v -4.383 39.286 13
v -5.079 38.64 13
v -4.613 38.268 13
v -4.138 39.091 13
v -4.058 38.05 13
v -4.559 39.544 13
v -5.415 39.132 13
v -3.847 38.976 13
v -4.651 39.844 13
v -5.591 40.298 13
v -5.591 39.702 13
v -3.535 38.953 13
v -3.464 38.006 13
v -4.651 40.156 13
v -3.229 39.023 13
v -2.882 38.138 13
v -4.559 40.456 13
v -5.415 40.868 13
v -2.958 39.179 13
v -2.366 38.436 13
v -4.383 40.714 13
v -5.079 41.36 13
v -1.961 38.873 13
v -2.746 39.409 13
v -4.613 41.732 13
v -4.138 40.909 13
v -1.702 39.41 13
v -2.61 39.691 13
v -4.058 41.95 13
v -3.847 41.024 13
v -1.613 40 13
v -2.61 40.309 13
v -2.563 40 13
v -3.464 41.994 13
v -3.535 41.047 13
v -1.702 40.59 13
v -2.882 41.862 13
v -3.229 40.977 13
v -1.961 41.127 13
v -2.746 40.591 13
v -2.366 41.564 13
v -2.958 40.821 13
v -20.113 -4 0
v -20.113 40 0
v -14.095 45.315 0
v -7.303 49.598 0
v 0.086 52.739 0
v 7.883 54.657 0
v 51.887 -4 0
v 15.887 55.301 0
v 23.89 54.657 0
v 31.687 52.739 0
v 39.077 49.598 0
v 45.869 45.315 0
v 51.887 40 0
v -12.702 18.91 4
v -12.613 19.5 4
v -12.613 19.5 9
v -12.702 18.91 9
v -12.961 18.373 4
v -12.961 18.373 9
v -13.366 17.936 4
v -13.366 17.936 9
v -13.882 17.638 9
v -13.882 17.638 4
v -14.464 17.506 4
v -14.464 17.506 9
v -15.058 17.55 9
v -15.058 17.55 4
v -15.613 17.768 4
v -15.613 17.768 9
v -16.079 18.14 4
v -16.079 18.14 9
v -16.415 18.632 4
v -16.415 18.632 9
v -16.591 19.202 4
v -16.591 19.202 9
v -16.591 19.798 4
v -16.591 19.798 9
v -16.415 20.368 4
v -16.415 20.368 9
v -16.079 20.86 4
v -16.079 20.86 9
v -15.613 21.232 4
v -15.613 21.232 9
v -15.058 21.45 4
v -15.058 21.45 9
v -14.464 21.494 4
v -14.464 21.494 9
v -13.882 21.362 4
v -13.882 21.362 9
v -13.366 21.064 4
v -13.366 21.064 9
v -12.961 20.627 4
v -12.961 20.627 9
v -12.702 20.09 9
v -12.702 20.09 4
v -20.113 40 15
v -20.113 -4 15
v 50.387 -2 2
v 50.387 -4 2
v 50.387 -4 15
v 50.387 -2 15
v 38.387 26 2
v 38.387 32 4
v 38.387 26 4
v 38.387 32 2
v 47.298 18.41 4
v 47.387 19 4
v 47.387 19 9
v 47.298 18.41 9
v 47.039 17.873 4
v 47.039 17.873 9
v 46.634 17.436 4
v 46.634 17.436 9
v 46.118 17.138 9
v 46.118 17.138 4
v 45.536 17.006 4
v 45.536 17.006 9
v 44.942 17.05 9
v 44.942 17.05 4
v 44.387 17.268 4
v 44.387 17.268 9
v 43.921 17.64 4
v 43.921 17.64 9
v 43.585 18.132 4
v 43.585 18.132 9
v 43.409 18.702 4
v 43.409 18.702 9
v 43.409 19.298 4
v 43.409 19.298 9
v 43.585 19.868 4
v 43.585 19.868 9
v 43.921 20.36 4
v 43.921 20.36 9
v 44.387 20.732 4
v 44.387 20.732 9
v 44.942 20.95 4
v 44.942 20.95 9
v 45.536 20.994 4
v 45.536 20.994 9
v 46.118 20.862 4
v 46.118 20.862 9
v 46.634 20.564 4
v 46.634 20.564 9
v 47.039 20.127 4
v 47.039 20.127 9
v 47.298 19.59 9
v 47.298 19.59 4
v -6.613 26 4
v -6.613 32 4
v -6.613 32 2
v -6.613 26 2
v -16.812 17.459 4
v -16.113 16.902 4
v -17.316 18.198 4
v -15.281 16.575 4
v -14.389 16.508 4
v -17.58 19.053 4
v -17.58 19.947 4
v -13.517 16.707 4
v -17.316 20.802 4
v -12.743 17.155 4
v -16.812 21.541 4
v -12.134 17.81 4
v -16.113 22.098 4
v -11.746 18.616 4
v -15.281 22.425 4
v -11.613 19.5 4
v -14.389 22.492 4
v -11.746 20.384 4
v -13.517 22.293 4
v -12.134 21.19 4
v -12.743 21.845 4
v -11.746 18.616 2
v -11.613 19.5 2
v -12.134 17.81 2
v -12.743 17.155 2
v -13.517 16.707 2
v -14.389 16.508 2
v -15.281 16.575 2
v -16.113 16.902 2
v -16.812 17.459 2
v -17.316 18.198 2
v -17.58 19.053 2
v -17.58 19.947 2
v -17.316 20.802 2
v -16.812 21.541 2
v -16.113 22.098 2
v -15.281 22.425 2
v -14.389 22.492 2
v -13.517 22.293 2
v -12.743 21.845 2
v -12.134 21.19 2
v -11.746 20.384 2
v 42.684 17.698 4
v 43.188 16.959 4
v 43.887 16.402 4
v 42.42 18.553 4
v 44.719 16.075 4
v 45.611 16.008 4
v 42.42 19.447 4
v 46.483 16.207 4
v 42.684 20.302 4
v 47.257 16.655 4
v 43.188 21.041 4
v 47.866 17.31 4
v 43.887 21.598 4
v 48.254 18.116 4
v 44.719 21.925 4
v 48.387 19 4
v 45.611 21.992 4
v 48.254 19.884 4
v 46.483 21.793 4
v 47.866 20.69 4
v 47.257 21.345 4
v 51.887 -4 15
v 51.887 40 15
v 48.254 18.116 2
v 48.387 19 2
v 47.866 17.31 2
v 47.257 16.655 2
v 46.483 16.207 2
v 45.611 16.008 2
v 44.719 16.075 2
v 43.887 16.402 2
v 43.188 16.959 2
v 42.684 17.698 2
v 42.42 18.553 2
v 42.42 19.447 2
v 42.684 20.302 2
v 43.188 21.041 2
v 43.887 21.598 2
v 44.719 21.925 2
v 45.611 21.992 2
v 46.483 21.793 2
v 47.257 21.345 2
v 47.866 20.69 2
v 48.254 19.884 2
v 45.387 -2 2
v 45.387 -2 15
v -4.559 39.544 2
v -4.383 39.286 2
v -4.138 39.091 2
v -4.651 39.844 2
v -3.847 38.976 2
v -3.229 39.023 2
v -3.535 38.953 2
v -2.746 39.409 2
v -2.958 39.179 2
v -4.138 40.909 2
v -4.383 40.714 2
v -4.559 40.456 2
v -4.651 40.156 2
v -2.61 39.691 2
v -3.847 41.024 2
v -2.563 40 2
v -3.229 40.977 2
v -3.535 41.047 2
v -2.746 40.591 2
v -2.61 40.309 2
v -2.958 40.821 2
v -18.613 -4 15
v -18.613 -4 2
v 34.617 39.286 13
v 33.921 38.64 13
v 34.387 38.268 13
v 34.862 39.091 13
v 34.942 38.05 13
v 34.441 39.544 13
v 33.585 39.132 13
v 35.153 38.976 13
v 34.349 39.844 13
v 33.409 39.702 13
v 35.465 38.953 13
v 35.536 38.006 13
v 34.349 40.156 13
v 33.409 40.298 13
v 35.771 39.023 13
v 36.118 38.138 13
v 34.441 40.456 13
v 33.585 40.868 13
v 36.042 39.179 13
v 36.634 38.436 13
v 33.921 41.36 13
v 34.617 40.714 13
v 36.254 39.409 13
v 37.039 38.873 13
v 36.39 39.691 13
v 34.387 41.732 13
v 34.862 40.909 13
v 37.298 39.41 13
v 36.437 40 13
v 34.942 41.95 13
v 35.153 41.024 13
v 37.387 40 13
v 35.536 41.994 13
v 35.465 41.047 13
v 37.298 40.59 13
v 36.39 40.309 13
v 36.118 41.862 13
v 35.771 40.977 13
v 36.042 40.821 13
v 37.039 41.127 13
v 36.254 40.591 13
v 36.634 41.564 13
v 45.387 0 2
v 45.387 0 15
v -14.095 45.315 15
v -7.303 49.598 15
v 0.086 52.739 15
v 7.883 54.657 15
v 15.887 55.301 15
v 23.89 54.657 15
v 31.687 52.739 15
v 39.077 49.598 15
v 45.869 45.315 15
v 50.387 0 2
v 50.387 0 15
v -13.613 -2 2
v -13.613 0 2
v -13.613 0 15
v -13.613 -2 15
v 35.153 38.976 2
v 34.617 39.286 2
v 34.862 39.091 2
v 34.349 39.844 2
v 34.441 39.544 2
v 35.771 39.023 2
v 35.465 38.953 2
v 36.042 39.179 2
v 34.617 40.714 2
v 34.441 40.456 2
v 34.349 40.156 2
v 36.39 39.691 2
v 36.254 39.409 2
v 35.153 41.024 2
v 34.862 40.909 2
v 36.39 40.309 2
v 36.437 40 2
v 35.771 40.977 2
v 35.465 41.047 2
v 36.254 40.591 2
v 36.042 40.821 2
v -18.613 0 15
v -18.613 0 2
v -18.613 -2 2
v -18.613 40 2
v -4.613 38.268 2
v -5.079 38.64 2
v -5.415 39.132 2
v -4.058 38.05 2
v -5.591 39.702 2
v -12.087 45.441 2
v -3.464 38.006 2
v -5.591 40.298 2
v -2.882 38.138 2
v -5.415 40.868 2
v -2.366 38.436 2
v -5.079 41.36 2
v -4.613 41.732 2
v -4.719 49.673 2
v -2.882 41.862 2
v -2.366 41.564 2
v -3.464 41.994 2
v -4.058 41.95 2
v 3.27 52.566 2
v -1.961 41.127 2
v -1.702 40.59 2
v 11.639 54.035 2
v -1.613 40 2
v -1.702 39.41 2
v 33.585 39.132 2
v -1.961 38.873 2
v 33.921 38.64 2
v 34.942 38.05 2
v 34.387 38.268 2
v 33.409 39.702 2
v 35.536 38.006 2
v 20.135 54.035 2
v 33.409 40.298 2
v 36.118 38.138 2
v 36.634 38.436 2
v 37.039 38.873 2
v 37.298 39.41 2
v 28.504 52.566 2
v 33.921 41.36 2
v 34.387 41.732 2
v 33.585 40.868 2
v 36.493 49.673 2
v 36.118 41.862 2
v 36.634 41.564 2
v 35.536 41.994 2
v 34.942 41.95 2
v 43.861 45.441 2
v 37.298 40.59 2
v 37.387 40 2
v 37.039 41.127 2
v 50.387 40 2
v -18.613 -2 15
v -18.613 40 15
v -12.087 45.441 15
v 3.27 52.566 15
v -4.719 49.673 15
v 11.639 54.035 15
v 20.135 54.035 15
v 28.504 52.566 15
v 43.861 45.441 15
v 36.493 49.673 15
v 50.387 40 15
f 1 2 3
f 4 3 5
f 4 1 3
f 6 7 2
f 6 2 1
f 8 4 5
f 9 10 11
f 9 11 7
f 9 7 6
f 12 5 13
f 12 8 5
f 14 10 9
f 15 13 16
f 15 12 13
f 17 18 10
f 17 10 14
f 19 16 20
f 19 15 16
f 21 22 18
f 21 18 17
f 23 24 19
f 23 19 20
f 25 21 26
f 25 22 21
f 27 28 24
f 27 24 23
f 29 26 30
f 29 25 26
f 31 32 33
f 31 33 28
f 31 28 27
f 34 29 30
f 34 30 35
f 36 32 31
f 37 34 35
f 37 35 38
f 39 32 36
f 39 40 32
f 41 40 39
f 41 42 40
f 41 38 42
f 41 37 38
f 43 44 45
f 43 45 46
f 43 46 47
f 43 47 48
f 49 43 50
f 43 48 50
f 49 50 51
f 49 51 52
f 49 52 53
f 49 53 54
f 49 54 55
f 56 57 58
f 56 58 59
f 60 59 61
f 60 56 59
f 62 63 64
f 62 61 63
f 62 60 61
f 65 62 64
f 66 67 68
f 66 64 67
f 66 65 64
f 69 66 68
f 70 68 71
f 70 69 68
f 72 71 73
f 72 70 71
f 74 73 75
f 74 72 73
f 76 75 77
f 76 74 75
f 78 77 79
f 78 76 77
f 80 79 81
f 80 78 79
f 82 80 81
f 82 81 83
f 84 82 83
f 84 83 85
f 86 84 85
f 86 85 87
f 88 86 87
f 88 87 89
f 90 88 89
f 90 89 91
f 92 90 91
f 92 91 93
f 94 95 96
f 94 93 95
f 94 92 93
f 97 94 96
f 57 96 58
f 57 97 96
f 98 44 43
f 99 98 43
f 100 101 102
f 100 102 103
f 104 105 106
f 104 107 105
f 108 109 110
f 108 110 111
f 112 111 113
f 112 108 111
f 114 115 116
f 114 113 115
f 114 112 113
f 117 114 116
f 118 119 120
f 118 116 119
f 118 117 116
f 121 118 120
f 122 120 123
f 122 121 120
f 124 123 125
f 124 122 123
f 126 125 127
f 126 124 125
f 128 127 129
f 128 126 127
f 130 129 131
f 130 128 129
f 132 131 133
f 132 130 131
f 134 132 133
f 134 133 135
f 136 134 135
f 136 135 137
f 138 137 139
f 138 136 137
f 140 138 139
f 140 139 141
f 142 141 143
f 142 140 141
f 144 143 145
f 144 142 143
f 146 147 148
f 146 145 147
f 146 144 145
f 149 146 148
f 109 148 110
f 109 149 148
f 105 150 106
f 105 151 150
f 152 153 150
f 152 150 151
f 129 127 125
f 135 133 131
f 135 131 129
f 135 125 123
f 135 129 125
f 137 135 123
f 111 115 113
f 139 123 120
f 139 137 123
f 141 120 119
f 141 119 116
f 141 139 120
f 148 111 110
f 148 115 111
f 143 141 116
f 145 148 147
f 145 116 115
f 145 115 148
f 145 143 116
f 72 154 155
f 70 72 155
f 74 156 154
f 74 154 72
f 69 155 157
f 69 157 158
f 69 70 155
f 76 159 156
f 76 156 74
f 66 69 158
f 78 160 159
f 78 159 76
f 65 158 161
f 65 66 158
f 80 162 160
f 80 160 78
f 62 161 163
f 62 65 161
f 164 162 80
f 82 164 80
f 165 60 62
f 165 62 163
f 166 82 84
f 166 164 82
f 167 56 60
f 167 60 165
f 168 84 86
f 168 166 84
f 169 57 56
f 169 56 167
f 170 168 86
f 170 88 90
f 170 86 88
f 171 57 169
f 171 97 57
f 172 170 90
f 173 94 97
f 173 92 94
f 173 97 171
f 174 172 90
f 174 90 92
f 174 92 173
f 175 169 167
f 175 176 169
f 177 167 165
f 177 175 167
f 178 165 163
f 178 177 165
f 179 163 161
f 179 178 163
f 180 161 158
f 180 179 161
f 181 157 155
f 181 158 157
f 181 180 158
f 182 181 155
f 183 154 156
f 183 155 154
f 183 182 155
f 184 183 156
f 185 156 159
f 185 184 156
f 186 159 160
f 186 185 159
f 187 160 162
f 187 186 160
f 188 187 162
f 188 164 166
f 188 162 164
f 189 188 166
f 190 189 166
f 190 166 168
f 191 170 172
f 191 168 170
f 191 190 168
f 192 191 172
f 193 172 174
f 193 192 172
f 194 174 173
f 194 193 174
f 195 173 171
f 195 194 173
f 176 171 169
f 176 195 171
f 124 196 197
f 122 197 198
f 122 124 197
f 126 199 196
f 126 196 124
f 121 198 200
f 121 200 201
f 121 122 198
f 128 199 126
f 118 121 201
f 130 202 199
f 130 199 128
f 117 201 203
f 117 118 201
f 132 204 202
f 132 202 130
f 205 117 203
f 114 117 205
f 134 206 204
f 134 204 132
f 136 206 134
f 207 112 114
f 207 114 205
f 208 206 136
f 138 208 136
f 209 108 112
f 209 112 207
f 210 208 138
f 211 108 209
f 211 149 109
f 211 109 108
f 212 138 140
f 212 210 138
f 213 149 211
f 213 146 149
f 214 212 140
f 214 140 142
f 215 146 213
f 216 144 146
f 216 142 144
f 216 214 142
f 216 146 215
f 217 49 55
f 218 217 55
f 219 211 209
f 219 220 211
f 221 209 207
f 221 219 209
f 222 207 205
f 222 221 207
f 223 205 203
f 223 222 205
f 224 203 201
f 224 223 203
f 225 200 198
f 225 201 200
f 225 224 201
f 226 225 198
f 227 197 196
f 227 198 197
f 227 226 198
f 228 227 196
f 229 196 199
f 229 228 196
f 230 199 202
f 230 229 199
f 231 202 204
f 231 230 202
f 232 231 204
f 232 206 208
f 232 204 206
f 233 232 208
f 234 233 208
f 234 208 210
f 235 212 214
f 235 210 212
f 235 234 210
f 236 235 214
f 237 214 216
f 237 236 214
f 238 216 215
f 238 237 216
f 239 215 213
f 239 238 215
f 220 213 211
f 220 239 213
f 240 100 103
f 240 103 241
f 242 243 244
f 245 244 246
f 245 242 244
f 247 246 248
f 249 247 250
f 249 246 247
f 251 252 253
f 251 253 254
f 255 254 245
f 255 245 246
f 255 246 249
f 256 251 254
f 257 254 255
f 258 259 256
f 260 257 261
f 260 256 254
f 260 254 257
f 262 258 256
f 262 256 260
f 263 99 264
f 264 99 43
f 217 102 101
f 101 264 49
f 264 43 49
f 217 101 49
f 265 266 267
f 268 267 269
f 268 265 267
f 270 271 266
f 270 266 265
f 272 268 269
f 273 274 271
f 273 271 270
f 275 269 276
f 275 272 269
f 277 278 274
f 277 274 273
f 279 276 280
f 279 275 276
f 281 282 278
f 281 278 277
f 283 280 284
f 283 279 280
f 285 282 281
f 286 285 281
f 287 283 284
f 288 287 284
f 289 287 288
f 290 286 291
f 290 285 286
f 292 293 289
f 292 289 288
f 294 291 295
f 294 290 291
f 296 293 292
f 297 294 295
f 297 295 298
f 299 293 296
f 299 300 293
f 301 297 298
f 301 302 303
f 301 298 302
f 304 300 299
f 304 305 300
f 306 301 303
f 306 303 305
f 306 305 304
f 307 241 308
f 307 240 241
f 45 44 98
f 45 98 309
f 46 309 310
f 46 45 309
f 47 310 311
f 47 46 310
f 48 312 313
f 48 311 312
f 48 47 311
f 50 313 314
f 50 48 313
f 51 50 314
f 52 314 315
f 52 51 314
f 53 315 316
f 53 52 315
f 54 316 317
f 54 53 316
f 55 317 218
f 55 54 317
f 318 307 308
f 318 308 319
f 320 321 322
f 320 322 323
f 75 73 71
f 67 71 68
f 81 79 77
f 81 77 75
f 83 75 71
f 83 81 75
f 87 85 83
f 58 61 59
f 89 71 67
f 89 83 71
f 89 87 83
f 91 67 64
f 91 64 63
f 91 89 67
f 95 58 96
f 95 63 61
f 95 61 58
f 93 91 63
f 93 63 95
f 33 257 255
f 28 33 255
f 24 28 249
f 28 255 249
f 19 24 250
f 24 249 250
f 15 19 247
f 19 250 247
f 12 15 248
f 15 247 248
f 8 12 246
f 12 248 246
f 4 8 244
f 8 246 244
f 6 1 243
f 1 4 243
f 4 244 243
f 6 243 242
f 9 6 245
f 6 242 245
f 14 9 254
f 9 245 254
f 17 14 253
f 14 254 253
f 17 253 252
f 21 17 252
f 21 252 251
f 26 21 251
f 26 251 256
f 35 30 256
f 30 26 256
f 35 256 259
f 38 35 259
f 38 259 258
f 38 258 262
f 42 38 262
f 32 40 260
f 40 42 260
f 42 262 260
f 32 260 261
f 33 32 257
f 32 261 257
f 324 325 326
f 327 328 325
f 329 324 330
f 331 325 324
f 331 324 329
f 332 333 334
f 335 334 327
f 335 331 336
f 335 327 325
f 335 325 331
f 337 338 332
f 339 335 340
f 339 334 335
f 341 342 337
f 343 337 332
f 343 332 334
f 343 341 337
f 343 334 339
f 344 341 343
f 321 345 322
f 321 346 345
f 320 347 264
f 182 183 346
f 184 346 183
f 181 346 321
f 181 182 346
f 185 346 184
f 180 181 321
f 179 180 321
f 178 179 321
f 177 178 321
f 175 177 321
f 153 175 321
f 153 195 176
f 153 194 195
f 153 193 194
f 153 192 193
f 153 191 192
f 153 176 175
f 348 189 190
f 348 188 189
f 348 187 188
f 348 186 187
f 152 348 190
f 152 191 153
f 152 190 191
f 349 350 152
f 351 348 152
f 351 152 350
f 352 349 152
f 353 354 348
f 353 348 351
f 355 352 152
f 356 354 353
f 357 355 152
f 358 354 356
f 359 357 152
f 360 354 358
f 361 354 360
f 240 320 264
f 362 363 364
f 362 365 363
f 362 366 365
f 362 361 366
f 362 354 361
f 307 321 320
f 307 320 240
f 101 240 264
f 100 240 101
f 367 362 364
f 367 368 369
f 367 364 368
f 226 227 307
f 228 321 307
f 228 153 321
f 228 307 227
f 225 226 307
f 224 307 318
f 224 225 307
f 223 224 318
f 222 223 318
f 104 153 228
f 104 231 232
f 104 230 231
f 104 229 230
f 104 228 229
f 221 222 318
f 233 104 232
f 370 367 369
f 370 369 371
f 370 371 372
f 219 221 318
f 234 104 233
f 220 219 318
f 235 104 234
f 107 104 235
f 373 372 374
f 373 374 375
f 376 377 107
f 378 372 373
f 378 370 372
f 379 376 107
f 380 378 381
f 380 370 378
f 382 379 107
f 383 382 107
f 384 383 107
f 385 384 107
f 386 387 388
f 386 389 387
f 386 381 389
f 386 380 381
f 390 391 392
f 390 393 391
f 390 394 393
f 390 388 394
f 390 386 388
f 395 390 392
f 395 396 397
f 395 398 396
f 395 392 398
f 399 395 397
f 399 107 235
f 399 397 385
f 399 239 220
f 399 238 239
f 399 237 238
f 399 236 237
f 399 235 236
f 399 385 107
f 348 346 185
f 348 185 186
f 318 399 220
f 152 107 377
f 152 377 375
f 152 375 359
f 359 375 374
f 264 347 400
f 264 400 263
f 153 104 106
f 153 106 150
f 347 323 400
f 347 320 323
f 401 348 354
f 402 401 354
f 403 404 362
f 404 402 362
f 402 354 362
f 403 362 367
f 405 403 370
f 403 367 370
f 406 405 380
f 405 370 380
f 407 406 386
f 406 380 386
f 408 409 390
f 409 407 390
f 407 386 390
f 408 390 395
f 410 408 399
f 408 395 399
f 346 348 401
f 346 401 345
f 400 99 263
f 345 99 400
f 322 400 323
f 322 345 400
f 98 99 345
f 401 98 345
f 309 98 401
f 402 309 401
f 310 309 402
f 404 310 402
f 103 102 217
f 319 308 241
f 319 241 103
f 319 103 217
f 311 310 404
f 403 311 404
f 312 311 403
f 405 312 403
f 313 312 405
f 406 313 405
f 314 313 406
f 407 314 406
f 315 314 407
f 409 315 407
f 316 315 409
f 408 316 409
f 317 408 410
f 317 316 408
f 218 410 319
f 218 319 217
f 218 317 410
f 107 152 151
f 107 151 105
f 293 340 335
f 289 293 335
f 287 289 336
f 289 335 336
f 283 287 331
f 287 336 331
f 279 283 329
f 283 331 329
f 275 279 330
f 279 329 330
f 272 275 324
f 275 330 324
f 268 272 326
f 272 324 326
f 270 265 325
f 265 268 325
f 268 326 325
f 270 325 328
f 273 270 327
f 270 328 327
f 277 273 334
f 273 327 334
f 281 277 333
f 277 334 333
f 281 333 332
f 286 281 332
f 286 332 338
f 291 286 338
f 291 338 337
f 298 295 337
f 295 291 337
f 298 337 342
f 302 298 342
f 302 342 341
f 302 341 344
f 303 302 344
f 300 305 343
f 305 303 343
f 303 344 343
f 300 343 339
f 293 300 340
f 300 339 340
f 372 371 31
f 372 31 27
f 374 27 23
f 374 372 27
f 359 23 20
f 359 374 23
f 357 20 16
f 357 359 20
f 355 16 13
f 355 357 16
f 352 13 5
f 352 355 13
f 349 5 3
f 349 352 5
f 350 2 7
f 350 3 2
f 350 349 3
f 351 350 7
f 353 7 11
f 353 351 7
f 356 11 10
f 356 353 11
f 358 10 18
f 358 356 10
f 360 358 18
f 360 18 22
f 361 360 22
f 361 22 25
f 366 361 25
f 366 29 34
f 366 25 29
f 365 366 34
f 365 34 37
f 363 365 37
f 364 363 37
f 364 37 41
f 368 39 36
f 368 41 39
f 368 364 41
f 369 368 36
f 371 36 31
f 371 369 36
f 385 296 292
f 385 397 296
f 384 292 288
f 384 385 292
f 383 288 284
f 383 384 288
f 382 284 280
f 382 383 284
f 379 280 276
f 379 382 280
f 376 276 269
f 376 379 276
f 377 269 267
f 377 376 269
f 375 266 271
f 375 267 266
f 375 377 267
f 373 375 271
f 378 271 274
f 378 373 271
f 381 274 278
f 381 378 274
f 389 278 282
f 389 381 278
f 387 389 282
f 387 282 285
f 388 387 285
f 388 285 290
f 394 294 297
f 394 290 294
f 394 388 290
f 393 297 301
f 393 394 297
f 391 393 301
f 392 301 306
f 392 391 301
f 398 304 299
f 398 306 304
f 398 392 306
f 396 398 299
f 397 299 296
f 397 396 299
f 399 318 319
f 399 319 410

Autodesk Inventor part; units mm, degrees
ref_plane "YZ Plane" through (0, 0, 0) normal (1, 0, 0) x (0, 1, 0)
ref_plane "XZ Plane" through (0, 0, 0) normal (0, 1, 0) x (-1, 0, 0)
ref_plane "XY Plane" through (0, 0, 0) normal (0, 0, 1) x (1, 0, 0)
sketch "Skizze1" plane through (0, 0, 0) normal (0, 0, 1) x (1, 0, 0)
  line L0 (-20.1131, -4) -> (51.8869, -4)
  line L1 (51.8869, -4) -> (51.8869, 40)
  line L2 (51.8869, 40) -> (-20.1131, 40)
  line L3 (-20.1131, 40) -> (-20.1131, -4)
  arc A0 (51.8869, 40) -> (-20.1131, 40) centre (15.8869, 5.3013) ccw
  line L4 (50.3869, -4) -> (50.3869, 40)
  line L5 (-18.6131, 40) -> (-18.6131, -4)
  arc A1 (50.3869, 40) -> (-18.6131, 40) centre (15.8869, 5.2581) ccw
  point P0 (0, 0)
  dimension "d0" = 72
  dimension "d1" = 44
  dimension "d2" = 50
  dimension "d3" = 1.5
  dimension "d4" = 1.5
extrude "Extrusion1" add sketch "Skizze1" along normal blind 2 contours L5 L2 L4 L0 | A1 L2
extrude "Extrusion2" add sketch "Skizze1" along normal blind 15 contours L3 L2 L5 L0 | A0 L2 A1 | L4 L2 L1 L0
sketch "Skizze2" plane through (0, 0, 2) normal (0, 0, 1) x (1, 0, 0)
  circle A0 centre (-14.6131, 19.5) radius 3
  circle A1 centre (-14.6131, 19.5) radius 2
  circle A2 centre (45.3869, 19) radius 3
  circle A3 centre (45.3869, 19) radius 2
  line L0 (50.3869, 40) -> (50.3869, -4) projected
  line L1 (-18.6131, -4) -> (-18.6131, 40) projected
  circle A4 centre (-3.6131, 40) radius 2
  circle A5 centre (35.3869, 40) radius 2
  circle A6 centre (35.3869, 40) radius 1.05
  circle A7 centre (-3.6131, 40) radius 1.05
  line L2 (-6.6131, 32) -> (38.3869, 32)
  line L3 (38.3869, 32) -> (38.3869, 26)
  line L4 (38.3869, 26) -> (-6.6131, 26)
  line L5 (-6.6131, 26) -> (-6.6131, 32)
  line L6 (50.3869, -4) -> (43.3869, -4)
  line L7 (-18.6131, 0) -> (-13.6131, 0)
  line L8 (-13.6131, 0) -> (-13.6131, -2)
  line L9 (-13.6131, -2) -> (-18.6131, -2)
  line L10 (-18.6131, -2) -> (-18.6131, 0)
  line L11 (45.3869, 0) -> (50.3869, 0)
  line L12 (50.3869, 0) -> (50.3869, -2)
  line L13 (50.3869, -2) -> (45.3869, -2)
  line L14 (45.3869, -2) -> (45.3869, 0)
  line L15 (-18.6131, -4) -> (50.3869, -4) projected
  point P0 (0, 0)
  point P1 (15.8869, 26)
  point P2 (15.8869, 32)
  point P3 (-6.6131, 29)
  point P4 (38.3869, 29)
  point P5 (45.3869, -1)
  point P6 (-13.6131, -1)
  dimension "d9" = 6
  dimension "d10" = 4
  dimension "d11" = 6
  dimension "d12" = 4
  dimension "d13" = 5
  dimension "d14" = 4
  dimension "d21" = 4
  dimension "d22" = 4
  dimension "d23" = 2.1
  dimension "d24" = 2.1
  dimension "d27" = 15
  dimension "d28" = 15
  dimension "d29" = 60
  dimension "d30" = 6
  dimension "d31" = 45
  dimension "d32" = 12
  dimension "d33" = 12
  dimension "d40" = 5
  dimension "d41" = 2
  dimension "d43" = 5
  dimension "d44" = 2
  dimension "d45" = 2
  dimension "d46" = 59
  dimension "d47" = 23.5
  dimension "d48" = 23
  dimension "d49" = 44
  dimension "d50" = 44
  dimension "d51" = 30
extrude "Extrusion3" add sketch "Skizze2" along normal blind 2 contours A0 | A2 | L2 L3 L4 L5
extrude "Extrusion4" add sketch "Skizze2" along normal blind 7 contours A1 | A3
extrude "Extrusion5" add sketch "Skizze2" along normal blind 11 contours A4 | A5
extrude "Extrusion6" add sketch "Skizze2" along normal up to surface (13 mm away) contours L1 L7 L8 L9 | L0 L13 L14 L11
properties part number "Spiel"
